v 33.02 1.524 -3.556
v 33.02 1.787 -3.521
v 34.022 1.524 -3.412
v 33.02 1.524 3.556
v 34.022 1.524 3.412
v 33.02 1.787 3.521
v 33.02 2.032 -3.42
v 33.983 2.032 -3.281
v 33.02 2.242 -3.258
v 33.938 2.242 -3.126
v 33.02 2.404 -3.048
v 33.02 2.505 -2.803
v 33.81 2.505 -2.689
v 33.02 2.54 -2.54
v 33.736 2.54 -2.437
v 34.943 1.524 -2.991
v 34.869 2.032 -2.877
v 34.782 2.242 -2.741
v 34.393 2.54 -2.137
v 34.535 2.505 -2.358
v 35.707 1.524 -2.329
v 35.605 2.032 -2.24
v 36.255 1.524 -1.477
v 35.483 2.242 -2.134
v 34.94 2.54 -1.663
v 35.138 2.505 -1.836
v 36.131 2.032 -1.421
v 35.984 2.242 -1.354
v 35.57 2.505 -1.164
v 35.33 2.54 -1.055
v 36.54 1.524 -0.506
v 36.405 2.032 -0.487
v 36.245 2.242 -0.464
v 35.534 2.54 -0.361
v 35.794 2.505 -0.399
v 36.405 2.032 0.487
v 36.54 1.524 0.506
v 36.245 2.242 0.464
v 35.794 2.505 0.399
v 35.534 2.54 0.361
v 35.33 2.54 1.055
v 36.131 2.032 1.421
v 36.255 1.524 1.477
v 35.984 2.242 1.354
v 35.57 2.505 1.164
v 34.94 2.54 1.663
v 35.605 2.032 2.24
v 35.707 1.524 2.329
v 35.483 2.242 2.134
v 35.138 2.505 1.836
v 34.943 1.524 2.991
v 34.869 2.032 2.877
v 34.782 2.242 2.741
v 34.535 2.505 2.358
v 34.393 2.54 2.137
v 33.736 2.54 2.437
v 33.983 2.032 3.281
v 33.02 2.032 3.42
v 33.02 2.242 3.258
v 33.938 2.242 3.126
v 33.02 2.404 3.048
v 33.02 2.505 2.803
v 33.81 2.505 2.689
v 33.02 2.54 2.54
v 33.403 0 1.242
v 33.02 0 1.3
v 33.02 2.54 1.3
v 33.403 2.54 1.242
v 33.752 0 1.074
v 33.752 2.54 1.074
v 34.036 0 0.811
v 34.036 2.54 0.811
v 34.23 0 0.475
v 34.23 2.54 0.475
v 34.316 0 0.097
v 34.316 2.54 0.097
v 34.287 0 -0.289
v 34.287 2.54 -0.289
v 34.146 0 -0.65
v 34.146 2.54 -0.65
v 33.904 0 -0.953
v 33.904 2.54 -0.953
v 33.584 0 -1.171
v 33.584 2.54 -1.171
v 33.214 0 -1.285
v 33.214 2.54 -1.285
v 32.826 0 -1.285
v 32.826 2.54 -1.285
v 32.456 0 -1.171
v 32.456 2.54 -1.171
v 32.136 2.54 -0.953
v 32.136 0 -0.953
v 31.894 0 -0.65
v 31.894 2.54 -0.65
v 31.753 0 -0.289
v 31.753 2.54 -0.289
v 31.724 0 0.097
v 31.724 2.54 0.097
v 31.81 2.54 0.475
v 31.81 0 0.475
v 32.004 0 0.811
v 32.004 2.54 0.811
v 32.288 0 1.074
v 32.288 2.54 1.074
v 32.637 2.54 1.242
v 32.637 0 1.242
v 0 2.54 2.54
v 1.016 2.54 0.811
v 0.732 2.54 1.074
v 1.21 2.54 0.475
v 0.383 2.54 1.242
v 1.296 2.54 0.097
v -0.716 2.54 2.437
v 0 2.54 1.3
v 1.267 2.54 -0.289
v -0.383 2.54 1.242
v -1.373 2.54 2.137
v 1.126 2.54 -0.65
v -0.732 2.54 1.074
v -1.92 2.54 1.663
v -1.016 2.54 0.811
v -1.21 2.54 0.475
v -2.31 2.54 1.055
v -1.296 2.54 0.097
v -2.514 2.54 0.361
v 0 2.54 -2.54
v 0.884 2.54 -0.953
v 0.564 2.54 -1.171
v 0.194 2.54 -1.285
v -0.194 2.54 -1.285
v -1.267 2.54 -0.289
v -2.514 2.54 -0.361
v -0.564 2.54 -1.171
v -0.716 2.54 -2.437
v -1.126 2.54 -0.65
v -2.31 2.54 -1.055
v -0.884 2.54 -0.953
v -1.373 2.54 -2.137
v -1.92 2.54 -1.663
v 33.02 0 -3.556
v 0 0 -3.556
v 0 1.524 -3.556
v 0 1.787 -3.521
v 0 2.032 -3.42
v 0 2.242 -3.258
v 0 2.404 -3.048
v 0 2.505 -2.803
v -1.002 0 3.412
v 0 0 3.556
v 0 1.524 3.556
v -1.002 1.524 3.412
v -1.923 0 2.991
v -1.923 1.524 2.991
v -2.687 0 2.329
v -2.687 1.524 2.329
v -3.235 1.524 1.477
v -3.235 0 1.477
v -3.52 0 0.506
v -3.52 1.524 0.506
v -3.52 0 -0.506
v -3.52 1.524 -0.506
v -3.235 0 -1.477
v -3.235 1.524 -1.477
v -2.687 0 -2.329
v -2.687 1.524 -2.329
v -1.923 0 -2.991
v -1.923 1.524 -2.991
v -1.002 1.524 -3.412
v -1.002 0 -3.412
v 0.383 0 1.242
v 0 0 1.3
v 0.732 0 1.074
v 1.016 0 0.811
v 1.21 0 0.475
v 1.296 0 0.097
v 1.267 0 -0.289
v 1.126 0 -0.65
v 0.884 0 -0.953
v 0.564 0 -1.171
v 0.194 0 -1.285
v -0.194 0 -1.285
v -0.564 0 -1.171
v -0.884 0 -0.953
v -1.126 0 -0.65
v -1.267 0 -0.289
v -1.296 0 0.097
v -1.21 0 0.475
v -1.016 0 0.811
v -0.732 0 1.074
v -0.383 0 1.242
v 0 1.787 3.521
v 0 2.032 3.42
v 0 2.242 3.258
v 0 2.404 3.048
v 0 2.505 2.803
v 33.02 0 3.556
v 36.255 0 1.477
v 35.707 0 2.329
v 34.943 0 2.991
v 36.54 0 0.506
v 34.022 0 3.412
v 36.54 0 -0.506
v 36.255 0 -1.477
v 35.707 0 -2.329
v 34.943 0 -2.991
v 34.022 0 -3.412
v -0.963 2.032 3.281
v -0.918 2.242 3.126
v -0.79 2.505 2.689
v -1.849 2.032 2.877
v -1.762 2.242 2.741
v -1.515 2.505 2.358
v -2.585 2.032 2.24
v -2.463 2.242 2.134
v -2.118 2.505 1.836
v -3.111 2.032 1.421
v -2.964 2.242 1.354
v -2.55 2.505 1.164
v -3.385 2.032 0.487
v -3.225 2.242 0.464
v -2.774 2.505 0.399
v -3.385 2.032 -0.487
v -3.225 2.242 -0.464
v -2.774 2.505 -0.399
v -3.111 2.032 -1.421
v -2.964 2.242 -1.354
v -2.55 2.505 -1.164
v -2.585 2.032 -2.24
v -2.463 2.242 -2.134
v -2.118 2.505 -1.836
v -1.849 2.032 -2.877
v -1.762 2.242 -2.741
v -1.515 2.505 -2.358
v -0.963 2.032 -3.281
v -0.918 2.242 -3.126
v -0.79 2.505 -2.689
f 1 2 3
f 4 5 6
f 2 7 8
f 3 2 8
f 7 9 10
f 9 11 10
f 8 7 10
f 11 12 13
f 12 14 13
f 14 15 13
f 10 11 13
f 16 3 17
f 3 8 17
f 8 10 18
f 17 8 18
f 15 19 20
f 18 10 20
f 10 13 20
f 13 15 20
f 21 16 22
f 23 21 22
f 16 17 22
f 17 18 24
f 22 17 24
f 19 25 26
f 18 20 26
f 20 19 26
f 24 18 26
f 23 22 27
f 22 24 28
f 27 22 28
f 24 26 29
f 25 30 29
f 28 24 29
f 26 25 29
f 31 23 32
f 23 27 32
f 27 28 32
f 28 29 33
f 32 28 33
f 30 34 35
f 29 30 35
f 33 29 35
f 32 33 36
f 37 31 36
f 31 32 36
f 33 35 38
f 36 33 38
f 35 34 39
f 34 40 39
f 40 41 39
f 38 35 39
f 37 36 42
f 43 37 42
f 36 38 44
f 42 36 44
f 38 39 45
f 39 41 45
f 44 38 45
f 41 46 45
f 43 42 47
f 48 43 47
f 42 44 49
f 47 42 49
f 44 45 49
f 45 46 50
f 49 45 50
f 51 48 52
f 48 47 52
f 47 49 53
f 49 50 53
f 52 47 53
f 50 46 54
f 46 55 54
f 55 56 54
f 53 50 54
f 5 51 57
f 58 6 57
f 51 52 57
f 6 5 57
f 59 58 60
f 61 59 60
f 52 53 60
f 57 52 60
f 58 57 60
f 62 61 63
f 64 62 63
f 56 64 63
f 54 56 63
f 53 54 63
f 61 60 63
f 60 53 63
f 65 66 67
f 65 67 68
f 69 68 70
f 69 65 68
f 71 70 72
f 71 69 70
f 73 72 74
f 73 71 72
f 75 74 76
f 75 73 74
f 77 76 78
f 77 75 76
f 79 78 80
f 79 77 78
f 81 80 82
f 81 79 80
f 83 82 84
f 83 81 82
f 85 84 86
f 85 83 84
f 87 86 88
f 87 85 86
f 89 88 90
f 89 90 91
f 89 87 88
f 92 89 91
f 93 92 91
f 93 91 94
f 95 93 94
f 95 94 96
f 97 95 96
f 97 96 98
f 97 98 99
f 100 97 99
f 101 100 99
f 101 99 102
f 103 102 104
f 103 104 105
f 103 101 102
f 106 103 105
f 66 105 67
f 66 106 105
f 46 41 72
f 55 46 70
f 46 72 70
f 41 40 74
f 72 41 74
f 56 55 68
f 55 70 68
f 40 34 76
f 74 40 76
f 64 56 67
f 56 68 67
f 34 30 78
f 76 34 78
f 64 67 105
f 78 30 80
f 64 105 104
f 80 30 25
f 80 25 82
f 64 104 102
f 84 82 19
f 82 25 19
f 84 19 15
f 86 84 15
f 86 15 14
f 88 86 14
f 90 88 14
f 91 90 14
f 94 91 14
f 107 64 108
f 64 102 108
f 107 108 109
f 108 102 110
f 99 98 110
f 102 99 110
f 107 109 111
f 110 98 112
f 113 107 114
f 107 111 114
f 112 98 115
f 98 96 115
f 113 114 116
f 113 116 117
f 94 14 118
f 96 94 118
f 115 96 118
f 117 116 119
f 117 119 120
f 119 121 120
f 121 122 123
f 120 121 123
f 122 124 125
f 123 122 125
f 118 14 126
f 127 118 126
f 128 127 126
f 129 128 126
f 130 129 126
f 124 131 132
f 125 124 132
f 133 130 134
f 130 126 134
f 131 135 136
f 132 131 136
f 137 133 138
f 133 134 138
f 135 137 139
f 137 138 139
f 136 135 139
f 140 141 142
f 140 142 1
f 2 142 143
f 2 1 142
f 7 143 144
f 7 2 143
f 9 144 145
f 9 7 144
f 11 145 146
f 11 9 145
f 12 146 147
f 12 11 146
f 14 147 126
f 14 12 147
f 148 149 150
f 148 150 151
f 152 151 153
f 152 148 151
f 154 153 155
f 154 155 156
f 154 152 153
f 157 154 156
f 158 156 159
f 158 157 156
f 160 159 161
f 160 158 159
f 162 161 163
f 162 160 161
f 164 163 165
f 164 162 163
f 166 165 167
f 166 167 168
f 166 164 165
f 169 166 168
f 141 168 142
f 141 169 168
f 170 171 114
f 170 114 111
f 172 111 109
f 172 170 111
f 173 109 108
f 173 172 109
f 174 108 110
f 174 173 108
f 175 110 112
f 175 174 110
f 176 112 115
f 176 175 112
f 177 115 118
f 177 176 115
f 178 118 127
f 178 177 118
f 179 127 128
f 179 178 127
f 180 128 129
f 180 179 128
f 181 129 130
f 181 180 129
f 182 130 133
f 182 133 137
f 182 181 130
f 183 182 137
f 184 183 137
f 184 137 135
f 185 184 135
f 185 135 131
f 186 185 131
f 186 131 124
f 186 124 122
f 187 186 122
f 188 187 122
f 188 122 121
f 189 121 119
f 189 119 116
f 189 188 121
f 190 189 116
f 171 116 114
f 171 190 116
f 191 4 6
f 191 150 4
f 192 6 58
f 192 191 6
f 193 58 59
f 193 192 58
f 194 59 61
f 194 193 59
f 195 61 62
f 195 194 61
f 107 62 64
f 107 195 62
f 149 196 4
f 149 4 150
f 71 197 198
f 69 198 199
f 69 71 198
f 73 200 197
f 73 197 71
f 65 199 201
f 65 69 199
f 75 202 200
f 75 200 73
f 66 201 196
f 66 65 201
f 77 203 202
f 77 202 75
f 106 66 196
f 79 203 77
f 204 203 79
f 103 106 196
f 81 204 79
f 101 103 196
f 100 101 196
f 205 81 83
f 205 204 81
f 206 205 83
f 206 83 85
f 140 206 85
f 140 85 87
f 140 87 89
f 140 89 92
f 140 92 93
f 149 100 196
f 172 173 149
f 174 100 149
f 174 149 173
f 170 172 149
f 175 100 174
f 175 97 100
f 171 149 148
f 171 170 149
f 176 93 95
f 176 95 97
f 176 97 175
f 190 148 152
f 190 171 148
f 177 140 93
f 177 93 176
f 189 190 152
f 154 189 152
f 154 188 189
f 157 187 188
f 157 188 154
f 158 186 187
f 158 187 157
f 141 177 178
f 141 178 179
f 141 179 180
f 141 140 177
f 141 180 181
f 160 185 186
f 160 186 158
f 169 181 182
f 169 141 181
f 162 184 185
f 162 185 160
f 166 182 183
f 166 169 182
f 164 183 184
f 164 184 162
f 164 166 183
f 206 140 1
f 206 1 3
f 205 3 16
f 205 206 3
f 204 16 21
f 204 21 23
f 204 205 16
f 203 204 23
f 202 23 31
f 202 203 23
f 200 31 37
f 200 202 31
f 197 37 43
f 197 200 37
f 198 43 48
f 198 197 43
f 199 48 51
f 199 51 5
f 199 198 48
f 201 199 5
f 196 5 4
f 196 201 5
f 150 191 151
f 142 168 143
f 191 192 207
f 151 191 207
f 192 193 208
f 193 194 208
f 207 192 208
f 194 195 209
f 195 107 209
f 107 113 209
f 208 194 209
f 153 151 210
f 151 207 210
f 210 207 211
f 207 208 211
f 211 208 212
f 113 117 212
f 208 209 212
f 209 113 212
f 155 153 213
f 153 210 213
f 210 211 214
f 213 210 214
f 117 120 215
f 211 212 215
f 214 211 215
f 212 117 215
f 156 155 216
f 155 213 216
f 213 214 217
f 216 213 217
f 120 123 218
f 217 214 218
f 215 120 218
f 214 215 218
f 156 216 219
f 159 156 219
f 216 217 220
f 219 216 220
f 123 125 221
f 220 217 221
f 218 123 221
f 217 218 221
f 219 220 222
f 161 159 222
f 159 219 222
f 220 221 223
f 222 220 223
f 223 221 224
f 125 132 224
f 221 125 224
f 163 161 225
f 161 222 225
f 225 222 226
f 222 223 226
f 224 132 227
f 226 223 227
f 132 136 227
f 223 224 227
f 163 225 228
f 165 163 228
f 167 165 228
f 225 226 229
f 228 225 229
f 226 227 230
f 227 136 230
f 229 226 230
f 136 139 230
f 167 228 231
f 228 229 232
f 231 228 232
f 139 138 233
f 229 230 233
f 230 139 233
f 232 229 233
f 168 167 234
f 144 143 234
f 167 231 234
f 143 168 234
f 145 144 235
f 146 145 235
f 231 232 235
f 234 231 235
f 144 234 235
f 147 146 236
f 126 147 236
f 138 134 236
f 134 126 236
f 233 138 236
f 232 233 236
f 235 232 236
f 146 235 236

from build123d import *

# Parameters (mm, degrees)
SKETCH1_R           = 1.3
BOSS_EXTRUDE1_DEPTH = 2.54
FILLET1_R           = 1.016


with BuildPart() as part:
    # Sketch1 → Boss-Extrude1 (new body)
    with BuildSketch(Plane(origin=(0, 0, 0), x_dir=(1, 0, 0), z_dir=(0, 1, 0))):
        with BuildLine():
            Line((0, 3.556), (33.02, 3.556))
            ThreePointArc((33.02, 3.556), (36.576, 0), (33.02, -3.556))
            Line((33.02, -3.556), (0, -3.556))
            ThreePointArc((0, -3.556), (-3.556, 0), (0, 3.556))
        make_face()
        with Locations(Location((0, 0, 0), (0, 0, 270))):
            Circle(SKETCH1_R, mode=Mode.SUBTRACT)
        with Locations(Location((33.02, 0, 0), (0, 0, 270))):
            Circle(SKETCH1_R, mode=Mode.SUBTRACT)
    extrude(amount=BOSS_EXTRUDE1_DEPTH)

    # Fillet1
    fillet1_edges = [part.edges().sort_by_distance(p)[0] for p in [
        (36.576, 2.54, 0),
        (16.51, 2.54, -3.556),
        (-3.556, 2.54, 0),
        (16.51, 2.54, 3.556),
    ]]
    fillet(fillet1_edges, radius=FILLET1_R)


solid = part.part
